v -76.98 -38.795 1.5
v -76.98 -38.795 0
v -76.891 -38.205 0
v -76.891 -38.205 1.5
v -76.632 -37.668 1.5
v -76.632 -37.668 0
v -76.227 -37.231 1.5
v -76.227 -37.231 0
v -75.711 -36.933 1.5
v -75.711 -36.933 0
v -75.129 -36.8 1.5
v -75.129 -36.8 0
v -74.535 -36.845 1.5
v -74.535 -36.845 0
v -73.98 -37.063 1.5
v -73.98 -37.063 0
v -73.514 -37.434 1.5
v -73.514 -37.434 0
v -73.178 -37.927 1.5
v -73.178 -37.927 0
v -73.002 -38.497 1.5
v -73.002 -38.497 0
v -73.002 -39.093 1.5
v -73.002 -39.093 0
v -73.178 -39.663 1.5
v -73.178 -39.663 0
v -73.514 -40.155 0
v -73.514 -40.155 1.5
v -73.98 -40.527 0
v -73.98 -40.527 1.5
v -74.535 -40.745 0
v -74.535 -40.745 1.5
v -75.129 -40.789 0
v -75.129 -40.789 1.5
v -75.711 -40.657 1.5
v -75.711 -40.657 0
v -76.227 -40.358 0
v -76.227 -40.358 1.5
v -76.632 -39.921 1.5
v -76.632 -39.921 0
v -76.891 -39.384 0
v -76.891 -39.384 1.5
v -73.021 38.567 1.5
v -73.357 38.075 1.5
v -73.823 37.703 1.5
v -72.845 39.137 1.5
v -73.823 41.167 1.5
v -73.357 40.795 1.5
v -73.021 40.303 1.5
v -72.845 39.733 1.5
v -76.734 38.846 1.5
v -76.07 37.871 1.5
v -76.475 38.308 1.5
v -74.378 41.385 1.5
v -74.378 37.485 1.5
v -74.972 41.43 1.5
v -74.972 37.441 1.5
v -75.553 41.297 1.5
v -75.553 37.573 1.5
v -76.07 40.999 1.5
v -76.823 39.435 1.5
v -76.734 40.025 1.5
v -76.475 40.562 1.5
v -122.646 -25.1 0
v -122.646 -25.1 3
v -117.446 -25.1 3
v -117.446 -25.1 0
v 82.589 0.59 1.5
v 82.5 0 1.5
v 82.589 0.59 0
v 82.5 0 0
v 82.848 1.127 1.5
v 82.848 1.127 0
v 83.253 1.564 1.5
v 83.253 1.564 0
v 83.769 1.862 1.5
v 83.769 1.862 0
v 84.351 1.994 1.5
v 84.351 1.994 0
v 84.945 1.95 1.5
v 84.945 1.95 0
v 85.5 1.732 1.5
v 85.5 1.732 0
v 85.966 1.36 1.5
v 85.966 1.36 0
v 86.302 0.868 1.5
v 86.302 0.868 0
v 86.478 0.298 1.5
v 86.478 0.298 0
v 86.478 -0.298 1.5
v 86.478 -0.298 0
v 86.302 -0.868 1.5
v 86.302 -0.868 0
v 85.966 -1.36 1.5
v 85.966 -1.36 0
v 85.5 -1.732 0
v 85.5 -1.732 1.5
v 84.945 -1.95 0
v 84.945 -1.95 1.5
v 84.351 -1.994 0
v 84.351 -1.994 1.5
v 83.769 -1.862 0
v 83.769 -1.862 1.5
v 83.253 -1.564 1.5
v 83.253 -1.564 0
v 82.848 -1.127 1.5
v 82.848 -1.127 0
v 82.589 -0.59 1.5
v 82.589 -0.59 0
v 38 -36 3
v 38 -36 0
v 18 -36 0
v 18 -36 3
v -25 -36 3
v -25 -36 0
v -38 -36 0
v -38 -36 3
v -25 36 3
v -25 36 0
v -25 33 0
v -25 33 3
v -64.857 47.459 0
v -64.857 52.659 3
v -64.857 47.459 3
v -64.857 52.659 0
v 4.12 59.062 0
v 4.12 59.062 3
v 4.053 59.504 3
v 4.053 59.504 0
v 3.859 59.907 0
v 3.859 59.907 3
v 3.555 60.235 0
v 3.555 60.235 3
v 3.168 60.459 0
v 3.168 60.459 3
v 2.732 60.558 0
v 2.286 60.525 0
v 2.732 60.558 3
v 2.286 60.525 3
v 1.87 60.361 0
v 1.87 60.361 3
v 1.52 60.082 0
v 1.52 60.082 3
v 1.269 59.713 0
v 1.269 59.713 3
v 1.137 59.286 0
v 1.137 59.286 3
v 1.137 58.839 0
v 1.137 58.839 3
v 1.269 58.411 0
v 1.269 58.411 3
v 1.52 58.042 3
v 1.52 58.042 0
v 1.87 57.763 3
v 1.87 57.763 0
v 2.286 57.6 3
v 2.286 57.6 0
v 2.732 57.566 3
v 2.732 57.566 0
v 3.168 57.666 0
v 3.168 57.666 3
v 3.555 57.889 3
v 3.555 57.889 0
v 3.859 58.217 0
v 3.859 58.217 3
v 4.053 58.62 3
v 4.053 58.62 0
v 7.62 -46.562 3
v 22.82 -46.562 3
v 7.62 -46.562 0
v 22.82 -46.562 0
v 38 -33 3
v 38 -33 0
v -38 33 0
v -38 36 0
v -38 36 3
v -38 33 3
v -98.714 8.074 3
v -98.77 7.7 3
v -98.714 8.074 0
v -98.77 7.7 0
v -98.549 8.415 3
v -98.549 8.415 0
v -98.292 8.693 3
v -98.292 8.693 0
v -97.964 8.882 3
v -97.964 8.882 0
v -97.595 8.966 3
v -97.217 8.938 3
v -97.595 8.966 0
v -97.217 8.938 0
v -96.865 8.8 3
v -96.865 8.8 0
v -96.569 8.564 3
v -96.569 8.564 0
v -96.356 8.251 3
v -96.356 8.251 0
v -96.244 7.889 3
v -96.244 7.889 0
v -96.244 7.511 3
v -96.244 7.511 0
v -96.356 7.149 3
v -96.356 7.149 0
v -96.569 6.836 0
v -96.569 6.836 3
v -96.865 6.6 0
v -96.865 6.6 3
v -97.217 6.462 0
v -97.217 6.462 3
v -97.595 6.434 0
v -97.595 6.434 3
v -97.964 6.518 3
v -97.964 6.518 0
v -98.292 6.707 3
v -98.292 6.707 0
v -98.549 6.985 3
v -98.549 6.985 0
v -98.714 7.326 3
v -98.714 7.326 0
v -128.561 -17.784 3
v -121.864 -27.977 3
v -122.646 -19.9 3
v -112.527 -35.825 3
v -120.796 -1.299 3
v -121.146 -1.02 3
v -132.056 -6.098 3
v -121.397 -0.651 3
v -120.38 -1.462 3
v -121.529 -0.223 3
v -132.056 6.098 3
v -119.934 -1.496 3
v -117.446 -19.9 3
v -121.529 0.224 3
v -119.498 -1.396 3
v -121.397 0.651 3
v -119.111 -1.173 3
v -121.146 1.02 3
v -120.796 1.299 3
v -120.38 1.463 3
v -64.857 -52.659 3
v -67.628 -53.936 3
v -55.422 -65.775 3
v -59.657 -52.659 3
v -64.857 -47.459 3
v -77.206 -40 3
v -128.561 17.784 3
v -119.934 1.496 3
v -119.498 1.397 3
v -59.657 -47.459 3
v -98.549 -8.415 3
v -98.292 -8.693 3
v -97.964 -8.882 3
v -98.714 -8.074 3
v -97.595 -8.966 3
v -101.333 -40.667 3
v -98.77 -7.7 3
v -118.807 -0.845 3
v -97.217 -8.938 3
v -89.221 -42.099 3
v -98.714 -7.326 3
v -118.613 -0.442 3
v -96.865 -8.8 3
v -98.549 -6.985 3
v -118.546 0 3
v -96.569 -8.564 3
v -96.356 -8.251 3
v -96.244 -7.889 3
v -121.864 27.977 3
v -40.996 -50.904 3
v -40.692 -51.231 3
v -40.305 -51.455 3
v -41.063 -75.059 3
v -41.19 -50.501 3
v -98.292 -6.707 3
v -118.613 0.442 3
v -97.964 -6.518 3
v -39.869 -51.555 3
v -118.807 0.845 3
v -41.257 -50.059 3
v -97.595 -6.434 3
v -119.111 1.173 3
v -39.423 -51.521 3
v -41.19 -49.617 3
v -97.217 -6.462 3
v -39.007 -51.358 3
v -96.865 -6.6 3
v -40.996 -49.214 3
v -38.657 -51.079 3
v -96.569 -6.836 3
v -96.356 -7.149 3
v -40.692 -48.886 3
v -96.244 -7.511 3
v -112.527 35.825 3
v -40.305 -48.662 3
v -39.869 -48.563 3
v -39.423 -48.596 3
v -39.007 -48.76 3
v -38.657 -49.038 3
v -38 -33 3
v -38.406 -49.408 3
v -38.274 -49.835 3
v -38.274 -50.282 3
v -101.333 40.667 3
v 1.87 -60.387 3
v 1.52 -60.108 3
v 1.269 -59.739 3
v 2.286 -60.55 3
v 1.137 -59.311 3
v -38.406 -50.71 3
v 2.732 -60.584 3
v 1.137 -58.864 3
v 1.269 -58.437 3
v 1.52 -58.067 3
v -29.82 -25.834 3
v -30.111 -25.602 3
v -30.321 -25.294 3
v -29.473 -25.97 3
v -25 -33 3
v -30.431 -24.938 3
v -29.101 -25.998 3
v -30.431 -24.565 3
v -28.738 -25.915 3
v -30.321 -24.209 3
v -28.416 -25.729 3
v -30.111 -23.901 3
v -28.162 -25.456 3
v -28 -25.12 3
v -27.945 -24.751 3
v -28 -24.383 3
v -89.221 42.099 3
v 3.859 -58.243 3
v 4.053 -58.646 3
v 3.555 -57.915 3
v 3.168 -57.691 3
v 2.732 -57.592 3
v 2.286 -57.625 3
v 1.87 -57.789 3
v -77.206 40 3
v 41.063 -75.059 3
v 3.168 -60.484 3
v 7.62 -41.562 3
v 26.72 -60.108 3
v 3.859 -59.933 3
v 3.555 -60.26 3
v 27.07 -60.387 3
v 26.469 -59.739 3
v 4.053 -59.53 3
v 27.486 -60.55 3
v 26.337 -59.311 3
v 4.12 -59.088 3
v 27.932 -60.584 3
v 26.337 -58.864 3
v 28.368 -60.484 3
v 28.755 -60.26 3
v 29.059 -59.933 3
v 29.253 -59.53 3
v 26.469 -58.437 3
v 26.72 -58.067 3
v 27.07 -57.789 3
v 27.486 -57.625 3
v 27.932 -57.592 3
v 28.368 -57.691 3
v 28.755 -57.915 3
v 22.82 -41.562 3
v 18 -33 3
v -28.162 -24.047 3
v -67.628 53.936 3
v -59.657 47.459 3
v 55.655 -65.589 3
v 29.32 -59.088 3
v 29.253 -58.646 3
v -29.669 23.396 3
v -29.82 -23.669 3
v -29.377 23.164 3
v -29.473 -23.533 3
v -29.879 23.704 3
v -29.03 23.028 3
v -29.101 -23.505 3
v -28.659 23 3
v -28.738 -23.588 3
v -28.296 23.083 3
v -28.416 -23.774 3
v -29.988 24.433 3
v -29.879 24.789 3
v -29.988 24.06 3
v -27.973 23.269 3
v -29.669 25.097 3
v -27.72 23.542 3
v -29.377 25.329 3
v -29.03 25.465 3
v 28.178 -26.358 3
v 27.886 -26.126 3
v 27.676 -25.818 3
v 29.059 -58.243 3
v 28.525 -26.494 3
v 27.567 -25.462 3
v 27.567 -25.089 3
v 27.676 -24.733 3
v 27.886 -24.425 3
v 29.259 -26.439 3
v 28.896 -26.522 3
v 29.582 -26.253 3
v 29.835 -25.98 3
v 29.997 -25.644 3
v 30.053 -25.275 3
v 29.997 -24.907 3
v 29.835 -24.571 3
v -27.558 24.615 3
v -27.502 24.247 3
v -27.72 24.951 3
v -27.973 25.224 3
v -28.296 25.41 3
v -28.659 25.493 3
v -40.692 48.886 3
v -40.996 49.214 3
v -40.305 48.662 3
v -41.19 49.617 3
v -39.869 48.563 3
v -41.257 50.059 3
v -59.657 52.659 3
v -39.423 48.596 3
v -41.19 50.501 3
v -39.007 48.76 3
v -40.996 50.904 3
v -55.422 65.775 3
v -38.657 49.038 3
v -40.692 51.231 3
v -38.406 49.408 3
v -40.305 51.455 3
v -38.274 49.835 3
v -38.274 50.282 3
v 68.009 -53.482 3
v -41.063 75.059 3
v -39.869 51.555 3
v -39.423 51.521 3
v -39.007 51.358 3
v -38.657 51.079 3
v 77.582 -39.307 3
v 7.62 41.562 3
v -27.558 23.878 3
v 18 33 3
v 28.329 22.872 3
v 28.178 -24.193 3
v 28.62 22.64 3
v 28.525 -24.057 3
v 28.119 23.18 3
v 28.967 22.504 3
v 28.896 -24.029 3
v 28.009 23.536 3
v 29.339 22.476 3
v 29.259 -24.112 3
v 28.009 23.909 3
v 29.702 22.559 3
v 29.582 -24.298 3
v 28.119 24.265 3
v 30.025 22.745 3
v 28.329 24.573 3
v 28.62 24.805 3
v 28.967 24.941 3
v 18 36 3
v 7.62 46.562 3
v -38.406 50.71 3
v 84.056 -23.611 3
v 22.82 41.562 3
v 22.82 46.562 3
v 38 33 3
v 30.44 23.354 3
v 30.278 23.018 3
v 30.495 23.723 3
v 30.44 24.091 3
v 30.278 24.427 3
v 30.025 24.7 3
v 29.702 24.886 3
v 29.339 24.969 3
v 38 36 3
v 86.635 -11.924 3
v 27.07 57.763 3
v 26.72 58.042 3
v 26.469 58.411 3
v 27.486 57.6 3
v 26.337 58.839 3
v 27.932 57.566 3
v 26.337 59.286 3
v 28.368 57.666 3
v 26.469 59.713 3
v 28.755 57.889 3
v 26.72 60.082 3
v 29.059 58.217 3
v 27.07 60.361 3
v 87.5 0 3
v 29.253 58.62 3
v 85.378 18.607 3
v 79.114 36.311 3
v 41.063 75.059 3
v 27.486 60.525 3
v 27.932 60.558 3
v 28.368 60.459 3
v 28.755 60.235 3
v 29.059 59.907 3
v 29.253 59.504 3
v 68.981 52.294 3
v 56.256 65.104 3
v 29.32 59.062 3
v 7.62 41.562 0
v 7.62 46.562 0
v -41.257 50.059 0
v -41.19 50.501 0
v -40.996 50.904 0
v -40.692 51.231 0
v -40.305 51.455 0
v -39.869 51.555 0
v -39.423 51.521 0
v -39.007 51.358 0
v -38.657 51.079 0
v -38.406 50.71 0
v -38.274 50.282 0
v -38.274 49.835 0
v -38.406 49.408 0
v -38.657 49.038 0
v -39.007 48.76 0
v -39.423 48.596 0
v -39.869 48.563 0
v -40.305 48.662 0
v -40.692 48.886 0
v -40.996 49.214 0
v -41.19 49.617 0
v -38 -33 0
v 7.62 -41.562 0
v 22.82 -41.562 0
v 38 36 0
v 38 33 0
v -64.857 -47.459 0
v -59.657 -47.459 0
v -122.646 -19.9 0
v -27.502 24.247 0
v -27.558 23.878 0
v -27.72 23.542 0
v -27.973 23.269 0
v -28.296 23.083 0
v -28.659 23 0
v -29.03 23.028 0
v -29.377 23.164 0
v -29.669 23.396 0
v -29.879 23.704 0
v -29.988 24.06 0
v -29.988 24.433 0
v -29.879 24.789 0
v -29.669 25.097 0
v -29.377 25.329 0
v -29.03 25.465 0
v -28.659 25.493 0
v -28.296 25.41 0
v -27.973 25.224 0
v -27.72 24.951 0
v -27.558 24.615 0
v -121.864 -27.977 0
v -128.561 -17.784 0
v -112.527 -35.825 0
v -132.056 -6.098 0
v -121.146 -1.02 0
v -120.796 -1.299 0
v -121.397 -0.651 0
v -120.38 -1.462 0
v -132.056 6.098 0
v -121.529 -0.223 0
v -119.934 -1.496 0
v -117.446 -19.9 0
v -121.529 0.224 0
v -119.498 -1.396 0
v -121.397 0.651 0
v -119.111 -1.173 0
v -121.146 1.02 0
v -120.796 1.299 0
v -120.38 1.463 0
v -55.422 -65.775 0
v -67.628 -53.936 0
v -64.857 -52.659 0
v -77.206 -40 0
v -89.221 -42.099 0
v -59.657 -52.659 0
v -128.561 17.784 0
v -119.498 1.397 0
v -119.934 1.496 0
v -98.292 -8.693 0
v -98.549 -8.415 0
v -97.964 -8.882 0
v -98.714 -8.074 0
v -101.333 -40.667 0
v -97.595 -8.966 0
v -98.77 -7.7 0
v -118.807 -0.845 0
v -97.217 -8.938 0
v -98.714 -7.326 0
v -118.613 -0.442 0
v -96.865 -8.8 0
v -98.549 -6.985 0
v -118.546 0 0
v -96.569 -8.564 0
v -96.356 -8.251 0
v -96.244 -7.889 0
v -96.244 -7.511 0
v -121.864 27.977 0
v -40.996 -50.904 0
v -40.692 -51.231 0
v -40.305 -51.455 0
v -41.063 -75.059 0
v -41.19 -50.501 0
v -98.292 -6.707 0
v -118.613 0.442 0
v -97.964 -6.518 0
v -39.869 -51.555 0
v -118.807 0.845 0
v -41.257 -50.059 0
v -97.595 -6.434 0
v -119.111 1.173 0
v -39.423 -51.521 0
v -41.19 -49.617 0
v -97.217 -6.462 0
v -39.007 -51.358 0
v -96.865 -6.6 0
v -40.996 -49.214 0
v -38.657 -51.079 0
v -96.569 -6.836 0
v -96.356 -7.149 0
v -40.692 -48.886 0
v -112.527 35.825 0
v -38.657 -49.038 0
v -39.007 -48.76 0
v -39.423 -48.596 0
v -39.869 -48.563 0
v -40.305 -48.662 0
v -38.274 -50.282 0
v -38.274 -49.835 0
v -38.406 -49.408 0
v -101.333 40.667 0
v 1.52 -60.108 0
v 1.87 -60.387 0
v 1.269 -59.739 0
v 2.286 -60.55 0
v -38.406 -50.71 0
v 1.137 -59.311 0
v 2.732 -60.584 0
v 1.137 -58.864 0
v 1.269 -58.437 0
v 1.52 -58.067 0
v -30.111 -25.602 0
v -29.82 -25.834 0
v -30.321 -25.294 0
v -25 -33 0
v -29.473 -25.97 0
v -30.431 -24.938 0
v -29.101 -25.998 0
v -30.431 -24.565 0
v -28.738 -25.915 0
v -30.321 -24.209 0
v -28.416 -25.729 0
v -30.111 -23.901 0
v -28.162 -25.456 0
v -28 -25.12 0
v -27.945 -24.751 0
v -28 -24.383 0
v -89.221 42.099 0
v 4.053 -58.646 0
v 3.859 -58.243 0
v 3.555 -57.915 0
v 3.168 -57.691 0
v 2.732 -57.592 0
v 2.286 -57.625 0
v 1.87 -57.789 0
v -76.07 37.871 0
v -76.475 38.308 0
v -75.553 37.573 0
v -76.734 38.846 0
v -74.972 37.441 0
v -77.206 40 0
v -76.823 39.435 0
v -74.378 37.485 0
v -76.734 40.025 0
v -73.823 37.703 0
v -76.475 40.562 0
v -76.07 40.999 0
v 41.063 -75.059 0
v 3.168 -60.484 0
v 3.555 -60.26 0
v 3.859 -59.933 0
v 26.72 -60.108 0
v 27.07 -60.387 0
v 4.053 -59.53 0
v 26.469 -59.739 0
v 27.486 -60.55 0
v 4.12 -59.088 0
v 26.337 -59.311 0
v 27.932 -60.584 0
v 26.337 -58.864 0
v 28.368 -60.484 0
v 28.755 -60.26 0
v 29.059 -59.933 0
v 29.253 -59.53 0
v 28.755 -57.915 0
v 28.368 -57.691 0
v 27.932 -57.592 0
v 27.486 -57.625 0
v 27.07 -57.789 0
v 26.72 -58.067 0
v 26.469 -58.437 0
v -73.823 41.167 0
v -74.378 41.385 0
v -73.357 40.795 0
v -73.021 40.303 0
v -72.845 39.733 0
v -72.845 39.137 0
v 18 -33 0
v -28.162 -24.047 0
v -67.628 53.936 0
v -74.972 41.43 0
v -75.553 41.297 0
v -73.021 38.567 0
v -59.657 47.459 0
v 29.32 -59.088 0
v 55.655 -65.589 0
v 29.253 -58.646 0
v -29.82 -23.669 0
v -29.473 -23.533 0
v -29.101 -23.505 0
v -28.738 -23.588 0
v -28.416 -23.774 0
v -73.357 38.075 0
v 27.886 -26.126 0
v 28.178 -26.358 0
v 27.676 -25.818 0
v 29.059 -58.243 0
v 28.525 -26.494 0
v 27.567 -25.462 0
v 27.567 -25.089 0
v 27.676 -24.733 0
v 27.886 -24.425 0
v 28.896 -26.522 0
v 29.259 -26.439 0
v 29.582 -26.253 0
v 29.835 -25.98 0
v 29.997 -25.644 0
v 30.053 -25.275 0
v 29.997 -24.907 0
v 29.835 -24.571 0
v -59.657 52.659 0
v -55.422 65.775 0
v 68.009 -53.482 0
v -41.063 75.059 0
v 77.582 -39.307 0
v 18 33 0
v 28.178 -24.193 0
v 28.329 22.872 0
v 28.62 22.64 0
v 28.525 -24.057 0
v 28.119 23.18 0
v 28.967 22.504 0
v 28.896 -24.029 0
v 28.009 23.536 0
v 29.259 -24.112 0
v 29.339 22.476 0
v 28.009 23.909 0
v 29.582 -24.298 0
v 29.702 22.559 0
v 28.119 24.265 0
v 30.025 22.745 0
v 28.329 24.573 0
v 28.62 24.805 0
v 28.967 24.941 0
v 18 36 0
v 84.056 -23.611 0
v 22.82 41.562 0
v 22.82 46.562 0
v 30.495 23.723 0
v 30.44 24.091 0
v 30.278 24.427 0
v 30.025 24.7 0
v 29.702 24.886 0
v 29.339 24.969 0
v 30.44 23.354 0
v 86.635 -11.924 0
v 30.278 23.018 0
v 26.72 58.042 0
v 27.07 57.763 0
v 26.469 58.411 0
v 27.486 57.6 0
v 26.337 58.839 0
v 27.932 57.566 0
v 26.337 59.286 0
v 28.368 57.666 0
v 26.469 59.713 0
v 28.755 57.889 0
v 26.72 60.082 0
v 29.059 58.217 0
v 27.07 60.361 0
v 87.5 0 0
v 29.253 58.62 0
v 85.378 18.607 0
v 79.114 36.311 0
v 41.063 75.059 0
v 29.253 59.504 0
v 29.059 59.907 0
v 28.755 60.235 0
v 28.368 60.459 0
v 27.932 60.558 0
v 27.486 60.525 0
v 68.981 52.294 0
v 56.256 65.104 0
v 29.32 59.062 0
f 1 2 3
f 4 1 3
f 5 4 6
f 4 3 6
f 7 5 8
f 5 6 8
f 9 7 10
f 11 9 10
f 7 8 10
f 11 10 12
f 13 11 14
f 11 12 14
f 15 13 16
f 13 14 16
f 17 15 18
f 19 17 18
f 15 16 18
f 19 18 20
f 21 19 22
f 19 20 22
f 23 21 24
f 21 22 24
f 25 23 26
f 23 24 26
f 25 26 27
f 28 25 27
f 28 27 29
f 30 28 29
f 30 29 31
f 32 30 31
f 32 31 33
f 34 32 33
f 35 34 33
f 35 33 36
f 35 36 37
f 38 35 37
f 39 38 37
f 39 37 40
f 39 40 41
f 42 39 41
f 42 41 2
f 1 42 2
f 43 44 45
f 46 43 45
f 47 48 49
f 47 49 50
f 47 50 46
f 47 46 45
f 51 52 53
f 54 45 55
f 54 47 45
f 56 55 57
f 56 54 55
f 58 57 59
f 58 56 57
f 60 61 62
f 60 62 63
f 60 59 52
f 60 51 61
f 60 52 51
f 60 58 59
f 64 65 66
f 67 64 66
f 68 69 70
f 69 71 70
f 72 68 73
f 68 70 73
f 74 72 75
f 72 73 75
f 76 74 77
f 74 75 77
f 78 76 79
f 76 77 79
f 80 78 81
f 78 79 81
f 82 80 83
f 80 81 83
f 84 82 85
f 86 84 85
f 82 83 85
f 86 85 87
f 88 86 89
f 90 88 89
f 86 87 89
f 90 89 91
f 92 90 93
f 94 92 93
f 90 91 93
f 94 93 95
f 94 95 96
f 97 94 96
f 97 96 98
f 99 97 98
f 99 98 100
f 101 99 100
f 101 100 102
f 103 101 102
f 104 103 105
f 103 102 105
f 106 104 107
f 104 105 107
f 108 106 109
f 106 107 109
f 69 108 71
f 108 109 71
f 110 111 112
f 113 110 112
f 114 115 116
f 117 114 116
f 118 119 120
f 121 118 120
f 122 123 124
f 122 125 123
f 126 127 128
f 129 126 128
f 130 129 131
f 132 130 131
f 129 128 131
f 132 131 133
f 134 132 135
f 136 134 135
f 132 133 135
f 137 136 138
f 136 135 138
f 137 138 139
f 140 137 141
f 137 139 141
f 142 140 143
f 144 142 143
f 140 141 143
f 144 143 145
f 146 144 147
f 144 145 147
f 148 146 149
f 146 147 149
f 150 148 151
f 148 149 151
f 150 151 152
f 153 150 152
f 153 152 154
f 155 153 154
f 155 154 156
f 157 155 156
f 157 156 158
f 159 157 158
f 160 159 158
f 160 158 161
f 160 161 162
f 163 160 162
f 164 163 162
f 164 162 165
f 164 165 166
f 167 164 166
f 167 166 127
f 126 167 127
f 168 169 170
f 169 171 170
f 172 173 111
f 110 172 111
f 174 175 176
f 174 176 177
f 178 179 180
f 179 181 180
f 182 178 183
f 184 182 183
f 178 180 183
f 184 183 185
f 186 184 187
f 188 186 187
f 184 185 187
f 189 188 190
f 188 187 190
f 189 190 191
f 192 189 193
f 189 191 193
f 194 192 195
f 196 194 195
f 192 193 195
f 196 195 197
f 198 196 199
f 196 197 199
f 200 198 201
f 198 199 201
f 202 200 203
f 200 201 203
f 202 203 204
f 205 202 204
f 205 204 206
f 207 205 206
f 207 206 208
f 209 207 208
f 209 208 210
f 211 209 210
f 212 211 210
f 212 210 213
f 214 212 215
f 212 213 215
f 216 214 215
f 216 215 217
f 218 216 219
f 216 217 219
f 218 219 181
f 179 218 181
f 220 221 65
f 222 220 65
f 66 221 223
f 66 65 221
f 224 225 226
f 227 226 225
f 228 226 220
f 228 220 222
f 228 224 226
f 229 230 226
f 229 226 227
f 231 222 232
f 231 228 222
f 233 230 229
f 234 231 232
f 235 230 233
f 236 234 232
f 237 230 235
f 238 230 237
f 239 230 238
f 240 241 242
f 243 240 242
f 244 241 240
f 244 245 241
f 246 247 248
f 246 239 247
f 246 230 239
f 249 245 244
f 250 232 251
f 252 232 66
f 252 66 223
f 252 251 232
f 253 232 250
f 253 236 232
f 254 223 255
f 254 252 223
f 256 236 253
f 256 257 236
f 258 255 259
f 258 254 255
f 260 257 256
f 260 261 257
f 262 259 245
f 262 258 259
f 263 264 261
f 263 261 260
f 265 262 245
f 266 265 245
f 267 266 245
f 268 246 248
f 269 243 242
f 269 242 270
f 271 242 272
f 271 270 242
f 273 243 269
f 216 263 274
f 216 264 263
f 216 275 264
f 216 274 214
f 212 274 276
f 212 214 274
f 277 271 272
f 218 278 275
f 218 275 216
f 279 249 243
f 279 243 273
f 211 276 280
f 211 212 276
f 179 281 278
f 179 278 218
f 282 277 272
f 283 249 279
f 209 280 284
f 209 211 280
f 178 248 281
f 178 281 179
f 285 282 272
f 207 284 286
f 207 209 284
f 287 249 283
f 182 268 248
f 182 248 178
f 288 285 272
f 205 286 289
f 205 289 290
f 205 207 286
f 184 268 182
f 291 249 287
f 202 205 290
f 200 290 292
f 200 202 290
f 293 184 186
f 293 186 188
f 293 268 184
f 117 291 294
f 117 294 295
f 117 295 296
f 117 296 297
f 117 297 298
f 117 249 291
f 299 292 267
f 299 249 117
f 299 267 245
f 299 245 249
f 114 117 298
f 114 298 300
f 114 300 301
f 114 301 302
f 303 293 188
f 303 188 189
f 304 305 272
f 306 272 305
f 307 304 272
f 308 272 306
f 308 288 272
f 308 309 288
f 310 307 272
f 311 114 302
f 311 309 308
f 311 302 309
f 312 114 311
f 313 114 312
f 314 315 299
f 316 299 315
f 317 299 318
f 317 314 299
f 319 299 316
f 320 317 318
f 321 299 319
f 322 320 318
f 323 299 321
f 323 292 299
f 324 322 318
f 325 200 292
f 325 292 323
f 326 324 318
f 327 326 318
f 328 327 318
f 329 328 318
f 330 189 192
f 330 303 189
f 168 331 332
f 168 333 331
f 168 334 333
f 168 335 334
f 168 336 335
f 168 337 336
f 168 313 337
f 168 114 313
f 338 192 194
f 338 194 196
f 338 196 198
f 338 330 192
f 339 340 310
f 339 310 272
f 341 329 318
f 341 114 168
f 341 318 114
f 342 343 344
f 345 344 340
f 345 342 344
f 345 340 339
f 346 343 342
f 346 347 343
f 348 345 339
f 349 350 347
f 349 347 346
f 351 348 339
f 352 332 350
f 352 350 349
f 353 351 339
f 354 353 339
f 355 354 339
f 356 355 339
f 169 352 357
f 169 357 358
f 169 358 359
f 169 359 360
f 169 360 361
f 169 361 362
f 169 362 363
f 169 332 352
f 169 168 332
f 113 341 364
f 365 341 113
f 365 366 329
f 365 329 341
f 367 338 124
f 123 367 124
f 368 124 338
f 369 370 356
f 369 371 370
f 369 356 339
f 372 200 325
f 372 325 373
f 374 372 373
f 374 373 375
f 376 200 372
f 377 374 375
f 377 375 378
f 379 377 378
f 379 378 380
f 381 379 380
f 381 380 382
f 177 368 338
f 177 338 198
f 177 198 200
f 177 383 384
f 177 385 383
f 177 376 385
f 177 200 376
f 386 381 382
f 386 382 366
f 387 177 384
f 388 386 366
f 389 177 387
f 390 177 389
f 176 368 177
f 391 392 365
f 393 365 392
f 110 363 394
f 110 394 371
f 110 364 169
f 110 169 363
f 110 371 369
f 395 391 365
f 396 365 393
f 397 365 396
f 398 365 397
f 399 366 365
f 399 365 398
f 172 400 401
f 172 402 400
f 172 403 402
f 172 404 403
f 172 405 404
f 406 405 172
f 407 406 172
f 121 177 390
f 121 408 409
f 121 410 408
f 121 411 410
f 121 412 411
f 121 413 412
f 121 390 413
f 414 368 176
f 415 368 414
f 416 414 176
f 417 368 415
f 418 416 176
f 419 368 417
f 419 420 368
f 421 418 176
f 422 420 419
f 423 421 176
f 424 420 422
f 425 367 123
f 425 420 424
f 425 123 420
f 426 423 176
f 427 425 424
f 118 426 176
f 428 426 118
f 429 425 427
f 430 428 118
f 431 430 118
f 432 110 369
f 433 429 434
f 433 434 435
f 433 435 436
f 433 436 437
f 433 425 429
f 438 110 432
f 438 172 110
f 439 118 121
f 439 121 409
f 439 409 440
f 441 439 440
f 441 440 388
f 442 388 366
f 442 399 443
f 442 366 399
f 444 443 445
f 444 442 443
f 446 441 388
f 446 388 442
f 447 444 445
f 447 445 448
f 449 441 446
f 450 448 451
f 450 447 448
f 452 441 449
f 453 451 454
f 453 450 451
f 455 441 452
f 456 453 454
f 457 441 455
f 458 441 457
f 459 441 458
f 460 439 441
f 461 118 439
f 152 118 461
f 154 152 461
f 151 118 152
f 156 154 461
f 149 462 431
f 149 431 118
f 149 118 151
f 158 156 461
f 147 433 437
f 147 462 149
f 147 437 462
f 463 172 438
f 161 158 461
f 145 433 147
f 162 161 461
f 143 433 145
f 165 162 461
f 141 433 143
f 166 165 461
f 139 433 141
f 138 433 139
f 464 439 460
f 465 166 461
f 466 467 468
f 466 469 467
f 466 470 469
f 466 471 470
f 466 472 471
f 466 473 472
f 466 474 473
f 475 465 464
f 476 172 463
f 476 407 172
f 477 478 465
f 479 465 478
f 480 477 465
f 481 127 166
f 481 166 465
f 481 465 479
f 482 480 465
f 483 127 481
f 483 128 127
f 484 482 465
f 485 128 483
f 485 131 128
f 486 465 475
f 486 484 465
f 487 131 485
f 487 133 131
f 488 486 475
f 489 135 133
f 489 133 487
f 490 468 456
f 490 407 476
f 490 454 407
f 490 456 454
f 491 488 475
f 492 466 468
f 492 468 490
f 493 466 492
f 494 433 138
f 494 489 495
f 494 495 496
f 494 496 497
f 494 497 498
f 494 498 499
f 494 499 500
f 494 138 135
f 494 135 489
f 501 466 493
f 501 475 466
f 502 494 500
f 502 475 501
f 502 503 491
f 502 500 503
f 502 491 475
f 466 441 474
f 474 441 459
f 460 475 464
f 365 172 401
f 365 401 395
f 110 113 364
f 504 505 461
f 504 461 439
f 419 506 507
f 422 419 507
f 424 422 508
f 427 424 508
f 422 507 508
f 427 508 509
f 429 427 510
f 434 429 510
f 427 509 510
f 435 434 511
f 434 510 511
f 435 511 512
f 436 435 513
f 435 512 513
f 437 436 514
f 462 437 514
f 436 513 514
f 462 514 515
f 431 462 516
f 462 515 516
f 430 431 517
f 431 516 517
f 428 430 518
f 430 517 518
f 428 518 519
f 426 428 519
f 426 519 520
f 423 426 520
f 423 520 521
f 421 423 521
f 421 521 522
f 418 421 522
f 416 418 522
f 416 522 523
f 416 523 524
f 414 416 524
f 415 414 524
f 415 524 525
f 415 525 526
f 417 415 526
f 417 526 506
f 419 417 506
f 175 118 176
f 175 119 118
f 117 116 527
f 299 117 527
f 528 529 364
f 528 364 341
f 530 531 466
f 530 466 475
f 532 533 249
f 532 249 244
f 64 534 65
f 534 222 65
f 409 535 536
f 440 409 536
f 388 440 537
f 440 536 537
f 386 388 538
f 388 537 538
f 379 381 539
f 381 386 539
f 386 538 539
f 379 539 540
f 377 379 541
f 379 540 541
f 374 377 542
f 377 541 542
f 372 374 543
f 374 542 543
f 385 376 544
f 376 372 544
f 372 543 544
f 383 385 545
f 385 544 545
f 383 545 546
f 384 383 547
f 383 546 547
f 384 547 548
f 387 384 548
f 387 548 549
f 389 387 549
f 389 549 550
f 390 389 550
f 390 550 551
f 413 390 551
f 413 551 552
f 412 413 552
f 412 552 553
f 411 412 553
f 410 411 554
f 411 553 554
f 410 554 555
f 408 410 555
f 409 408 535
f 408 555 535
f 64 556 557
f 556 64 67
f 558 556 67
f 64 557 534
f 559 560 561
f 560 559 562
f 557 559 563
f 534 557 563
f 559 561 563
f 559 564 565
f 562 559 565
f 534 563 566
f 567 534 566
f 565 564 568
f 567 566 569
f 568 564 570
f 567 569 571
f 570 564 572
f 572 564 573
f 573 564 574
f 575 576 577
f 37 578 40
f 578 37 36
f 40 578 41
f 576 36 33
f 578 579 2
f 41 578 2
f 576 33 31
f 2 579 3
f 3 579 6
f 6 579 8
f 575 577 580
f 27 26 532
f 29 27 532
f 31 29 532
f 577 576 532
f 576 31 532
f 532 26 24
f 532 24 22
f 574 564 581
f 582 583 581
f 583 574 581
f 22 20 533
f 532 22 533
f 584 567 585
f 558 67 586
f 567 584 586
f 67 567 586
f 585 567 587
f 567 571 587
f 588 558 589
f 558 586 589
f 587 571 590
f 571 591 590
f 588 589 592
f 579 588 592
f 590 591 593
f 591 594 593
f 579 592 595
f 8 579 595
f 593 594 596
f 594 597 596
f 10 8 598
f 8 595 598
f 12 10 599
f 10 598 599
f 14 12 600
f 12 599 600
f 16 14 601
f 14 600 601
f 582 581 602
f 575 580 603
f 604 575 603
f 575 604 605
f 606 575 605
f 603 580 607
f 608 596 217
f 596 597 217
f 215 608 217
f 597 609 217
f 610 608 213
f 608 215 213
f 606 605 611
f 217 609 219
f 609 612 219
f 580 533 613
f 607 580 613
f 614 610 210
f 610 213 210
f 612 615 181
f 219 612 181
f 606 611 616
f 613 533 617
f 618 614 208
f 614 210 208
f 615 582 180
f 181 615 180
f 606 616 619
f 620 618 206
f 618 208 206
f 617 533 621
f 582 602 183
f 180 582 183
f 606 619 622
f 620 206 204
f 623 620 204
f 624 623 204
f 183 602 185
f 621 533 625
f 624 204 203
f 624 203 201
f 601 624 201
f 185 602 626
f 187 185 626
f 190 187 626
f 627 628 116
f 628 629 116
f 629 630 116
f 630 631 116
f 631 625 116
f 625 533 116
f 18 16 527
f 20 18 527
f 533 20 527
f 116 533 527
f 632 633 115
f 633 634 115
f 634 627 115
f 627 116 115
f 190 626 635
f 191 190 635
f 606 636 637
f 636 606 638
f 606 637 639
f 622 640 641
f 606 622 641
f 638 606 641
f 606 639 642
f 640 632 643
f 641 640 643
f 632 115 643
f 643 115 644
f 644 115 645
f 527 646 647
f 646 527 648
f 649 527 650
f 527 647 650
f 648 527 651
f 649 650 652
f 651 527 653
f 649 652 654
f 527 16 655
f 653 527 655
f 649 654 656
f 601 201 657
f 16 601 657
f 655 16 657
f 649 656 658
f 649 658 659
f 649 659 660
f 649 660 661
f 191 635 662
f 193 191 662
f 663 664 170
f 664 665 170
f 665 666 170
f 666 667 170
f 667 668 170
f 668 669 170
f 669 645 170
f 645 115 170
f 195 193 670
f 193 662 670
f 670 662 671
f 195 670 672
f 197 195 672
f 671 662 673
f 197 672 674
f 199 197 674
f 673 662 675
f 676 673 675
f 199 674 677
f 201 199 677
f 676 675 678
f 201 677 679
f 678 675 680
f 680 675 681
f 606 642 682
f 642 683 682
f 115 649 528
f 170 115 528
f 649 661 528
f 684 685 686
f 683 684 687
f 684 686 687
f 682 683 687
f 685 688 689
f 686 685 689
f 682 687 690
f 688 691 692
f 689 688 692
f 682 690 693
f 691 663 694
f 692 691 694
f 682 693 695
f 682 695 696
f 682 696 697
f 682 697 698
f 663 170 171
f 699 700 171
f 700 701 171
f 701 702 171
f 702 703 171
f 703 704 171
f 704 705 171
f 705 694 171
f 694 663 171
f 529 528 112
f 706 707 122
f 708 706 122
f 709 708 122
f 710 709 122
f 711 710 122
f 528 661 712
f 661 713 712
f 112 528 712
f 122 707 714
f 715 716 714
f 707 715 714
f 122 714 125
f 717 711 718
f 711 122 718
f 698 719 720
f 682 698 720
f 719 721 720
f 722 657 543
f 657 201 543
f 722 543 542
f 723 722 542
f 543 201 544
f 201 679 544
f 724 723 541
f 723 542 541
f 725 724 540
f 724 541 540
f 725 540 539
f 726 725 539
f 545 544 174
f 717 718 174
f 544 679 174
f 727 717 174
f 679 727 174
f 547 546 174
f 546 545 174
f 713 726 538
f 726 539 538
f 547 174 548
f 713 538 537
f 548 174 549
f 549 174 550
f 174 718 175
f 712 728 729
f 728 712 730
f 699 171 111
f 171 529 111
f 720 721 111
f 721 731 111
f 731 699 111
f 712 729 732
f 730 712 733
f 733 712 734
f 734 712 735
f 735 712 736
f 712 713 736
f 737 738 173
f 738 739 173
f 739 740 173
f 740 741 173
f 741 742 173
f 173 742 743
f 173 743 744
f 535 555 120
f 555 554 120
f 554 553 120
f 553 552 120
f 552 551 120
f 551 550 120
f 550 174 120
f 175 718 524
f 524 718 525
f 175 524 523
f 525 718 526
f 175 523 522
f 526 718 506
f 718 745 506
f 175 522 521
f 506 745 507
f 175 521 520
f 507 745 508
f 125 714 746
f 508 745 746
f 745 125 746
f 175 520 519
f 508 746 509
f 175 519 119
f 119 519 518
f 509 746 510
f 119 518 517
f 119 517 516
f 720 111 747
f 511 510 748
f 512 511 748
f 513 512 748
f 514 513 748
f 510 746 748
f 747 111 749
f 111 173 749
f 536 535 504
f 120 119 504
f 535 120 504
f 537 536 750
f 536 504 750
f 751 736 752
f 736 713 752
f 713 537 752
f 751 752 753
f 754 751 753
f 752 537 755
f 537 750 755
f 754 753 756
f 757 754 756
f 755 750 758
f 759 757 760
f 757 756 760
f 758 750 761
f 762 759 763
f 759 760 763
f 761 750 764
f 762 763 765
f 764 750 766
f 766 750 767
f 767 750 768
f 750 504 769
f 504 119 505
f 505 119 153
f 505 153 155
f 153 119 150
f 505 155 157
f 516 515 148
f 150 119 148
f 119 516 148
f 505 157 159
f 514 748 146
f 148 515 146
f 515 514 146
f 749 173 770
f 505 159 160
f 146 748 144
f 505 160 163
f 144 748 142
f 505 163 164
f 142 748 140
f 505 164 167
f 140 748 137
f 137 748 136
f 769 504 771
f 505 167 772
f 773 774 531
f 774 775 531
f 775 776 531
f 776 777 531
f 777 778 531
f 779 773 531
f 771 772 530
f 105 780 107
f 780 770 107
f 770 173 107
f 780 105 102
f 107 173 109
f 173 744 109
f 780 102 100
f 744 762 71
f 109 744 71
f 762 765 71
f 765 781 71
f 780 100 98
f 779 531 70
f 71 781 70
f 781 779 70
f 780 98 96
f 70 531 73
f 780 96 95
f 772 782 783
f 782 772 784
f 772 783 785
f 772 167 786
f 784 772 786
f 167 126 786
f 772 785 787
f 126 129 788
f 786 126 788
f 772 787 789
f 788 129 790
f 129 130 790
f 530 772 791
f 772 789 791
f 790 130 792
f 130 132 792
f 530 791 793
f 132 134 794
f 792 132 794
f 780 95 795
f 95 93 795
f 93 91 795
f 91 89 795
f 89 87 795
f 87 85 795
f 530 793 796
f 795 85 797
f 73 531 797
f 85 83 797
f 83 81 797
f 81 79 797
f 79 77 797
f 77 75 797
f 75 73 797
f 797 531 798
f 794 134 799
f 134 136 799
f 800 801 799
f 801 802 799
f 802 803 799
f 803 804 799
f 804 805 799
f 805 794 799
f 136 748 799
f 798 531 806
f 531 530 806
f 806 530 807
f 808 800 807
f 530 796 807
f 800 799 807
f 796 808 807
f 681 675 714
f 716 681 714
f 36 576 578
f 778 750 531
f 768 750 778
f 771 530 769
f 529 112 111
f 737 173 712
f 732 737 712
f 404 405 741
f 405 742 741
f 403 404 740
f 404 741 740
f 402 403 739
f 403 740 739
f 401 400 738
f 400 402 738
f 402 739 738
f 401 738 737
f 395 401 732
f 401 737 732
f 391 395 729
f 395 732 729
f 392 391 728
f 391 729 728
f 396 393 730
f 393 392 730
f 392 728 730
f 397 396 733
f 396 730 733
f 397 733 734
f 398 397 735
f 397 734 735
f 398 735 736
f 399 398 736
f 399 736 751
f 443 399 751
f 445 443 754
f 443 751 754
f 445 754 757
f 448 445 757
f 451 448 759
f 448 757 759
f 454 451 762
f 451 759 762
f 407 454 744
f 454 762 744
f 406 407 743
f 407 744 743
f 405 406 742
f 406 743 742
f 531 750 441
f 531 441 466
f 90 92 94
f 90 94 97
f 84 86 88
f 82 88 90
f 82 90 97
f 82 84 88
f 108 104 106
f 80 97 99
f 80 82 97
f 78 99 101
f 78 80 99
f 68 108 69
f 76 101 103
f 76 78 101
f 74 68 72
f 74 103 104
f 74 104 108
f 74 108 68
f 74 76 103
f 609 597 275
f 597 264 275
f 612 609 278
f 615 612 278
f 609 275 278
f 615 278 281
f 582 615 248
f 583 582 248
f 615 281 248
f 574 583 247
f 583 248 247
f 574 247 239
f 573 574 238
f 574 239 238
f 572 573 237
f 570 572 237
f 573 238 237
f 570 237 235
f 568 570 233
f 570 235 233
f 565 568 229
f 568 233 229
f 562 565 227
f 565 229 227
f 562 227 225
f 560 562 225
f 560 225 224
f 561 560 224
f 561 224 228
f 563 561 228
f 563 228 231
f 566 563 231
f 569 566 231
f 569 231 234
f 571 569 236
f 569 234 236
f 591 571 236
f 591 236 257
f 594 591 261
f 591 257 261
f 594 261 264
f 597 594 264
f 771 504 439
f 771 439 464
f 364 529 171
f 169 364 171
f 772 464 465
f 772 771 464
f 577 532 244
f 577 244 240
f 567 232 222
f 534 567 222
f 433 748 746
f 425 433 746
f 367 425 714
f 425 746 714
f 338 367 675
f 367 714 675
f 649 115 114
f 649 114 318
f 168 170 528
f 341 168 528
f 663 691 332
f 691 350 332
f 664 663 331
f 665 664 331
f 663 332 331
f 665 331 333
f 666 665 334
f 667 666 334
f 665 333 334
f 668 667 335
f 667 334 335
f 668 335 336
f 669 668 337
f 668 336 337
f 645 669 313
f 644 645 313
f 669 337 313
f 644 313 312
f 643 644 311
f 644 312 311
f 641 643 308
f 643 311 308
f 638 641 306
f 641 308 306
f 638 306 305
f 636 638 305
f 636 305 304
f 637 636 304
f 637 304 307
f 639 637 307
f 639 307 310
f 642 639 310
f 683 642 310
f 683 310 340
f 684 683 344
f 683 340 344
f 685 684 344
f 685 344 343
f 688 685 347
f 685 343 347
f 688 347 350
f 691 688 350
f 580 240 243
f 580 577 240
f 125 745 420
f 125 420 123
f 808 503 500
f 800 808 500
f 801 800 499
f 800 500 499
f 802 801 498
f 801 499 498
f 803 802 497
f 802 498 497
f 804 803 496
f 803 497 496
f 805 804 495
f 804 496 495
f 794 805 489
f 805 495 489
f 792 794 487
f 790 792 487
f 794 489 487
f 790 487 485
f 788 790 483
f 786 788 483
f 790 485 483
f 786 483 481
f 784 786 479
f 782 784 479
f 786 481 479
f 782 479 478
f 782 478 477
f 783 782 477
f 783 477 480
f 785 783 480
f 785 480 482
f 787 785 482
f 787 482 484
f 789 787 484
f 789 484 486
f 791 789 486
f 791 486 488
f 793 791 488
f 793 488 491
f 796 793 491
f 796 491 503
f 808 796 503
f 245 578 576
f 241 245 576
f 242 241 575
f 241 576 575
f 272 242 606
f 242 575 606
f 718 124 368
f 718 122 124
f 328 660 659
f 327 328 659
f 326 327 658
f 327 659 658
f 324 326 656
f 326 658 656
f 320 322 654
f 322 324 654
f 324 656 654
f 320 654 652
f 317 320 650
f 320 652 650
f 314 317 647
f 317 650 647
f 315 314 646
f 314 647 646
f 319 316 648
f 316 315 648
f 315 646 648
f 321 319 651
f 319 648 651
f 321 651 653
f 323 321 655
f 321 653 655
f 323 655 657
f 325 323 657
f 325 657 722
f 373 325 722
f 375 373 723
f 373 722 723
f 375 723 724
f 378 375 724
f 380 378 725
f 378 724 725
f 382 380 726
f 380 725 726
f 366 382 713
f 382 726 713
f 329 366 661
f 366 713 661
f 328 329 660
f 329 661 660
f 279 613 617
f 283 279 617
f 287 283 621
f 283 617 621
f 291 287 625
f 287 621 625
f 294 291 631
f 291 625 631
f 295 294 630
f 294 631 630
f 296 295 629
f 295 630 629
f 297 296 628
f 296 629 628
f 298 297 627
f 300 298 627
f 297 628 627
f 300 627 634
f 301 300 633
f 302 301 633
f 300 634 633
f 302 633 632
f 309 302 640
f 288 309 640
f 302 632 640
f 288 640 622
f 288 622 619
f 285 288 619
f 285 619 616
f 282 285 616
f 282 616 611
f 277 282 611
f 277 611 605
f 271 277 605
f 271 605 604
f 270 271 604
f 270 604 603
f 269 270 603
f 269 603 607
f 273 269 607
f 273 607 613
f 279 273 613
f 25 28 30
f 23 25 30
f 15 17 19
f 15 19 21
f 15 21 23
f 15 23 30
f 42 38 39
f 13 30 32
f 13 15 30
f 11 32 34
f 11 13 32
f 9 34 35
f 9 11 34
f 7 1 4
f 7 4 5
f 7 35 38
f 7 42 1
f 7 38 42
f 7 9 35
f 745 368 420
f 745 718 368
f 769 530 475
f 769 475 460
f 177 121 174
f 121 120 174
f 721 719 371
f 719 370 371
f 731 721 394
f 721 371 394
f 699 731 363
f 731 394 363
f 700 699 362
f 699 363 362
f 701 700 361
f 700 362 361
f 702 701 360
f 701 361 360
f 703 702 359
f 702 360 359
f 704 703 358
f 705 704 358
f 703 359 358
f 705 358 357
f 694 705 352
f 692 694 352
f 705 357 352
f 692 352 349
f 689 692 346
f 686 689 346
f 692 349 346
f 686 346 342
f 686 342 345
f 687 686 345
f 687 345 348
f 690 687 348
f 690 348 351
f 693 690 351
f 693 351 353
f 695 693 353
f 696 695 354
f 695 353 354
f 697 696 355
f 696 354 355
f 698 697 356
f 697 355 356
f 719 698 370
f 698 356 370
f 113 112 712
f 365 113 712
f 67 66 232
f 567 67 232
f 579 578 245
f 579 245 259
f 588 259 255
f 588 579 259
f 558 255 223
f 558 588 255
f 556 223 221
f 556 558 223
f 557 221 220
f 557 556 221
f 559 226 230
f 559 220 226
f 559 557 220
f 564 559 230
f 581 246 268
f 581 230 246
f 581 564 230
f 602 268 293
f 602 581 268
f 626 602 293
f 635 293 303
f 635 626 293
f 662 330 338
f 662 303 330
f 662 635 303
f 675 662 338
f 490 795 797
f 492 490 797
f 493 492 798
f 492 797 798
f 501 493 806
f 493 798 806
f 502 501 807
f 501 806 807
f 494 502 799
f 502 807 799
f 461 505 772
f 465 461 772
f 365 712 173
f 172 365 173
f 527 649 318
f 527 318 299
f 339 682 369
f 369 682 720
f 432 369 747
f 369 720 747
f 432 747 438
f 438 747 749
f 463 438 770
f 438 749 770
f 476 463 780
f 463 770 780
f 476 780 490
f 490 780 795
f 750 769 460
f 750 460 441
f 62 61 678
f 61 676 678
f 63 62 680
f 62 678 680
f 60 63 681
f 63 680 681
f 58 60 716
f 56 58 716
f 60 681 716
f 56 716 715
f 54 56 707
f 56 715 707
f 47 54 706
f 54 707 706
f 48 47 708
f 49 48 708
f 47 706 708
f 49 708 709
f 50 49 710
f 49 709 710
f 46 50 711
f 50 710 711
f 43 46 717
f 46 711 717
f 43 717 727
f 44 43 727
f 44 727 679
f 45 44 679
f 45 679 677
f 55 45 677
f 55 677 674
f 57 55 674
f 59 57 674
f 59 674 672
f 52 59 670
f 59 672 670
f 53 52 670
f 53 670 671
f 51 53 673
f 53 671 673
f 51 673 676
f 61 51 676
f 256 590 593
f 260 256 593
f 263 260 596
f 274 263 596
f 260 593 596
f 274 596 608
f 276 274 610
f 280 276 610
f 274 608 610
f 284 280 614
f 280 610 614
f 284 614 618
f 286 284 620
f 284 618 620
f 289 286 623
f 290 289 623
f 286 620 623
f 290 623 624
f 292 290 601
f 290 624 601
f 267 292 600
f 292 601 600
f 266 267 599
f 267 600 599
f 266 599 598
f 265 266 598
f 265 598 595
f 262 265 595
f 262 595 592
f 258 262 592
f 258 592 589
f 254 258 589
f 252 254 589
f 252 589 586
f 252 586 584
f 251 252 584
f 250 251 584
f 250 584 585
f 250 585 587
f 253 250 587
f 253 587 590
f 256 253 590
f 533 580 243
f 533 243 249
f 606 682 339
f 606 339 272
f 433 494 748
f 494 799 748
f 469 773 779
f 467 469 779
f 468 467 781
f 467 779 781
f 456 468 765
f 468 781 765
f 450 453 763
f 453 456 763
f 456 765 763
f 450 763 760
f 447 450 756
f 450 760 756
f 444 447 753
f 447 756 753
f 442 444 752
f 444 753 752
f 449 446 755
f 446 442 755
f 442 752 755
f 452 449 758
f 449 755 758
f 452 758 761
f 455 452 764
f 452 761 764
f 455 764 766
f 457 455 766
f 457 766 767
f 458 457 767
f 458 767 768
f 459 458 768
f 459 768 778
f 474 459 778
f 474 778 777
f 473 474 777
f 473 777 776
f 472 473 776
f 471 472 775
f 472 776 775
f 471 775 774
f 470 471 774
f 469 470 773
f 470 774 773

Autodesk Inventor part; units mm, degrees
ref_plane "YZ Plane" through (0, 0, 0) normal (1, 0, 0) x (0, 1, 0)
ref_plane "XZ Plane" through (0, 0, 0) normal (0, 1, 0) x (-1, 0, 0)
ref_plane "XY Plane" through (0, 0, 0) normal (0, 0, 1) x (1, 0, 0)
sketch "Base" plane through (0, 0, 0) normal (0, 0, 1) x (1, 0, 0)
  circle A0 centre (-28.7523, 24.2466) radius 1.25 projected
  circle A1 centre (-29.1949, -24.7514) radius 1.25 projected
  arc A2 (-77.2059, 40) -> (-77.2059, -40) centre (-90.3849, 0) ccw
  line L0 (41.0629, -75.0587) -> (-41.0629, -75.0587)
  ellipse E0 centre (0, 0) end of major axis (-87.5, 0) minor radius 85 (-77.2059, -40) -> (-41.0629, -75.0587) ccw
  line L1 (0, 0) -> (87.5, 0)
  line L2 (41.0629, 75.0587) -> (-41.0629, 75.0587)
  ellipse E1 centre (0, 0) end of major axis (-87.5, 0) minor radius 85 (41.0629, -75.0587) -> (41.0629, 75.0587) ccw
  ellipse E2 centre (0, 0) end of major axis (-87.5, 0) minor radius 85 (-41.0629, 75.0587) -> (-77.2059, 40) ccw
  circle A3 centre (29.2453, 23.7226) radius 1.25 projected
  circle A4 centre (28.8027, -25.2754) radius 1.25 projected
  dimension "d84" = 87.5
  dimension "d85" = 75.0587
  dimension "d88" = 42.1151
sketch "Holes and Mounts" plane through (0, 0, 0) normal (0, 0, 1) x (1, 0, 0)
  line L0 (-9.7798, -74.0877) -> (40.2202, -74.0877)
  circle A0 centre (2.62, -59.0877) radius 1.5
  circle A1 centre (27.82, -59.0877) radius 1.5
  circle A2 centre (-39.757, 45.9313) radius 1.5
  line L1 (-59.657, 43.3313) -> (-64.857, 43.3313)
  line L2 (-64.857, 43.3313) -> (-64.857, 48.5313)
  line L3 (-64.857, 48.5313) -> (-59.657, 48.5313)
  line L4 (-59.657, 48.5313) -> (-59.657, 43.3313)
  line L5 (-59.657, 43.3313) -> (-64.857, 48.5313) construction
  line L6 (-64.857, 43.3313) -> (-59.657, 48.5313) construction
  line L7 (-9.7798, -74.0877) -> (-9.7798, -44.0877)
  line L8 (-9.7798, -44.0877) -> (40.2202, -44.0877)
  line L9 (40.2202, -44.0877) -> (40.2202, -74.0877)
  line L10 (59.2442, -0.0127) -> (-26.2941, -0.0127)
  circle A3 centre (2.62, 59.0622) radius 1.5
  circle A4 centre (27.82, 59.0622) radius 1.5
  line L11 (-9.7798, 74.0622) -> (40.2202, 74.0622)
  line L12 (-9.7798, 44.0622) -> (40.2202, 44.0622)
  line L13 (40.2202, 74.0622) -> (40.2202, 44.0622)
  line L14 (-9.7798, 74.0622) -> (-9.7798, 44.0622)
  circle A5 centre (-39.757, -45.9568) radius 1.5
  line L15 (-59.657, -48.5568) -> (-59.657, -43.3568)
  line L16 (-64.857, -48.5568) -> (-59.657, -48.5568)
  line L17 (-59.657, -43.3568) -> (-64.857, -43.3568)
  line L18 (-64.857, -43.3568) -> (-64.857, -48.5568)
  line L19 (-59.657, -43.3568) -> (-64.857, -48.5568) construction
  line L20 (-64.857, -43.3568) -> (-59.657, -48.5568) construction
  dimension "d53" = 3
  dimension "d54" = 5.2
  dimension "d55" = 5.2
  dimension "d62" = 30
extrude "ComponentARBHoles" add sketch "Base" along normal blind 3
sketch "Holes Only" plane through (0, 0, 3) normal (0, 0, 1) x (1, 0, 0)
  line L0 (-117.446, -25.0998) -> (-117.446, -19.8998)
  line L1 (-117.446, -19.8998) -> (-122.646, -19.8998)
  line L2 (-122.646, -19.8998) -> (-122.646, -25.0998)
  circle A0 centre (-120.046, 0.0002) radius 1.5
  line L3 (-122.646, -25.0998) -> (-117.446, -25.0998)
  circle A1 centre (27.82, -59.0877) radius 1.5
  line L4 (27.82, -59.0877) -> (2.62, -59.0877)
  circle A2 centre (27.82, -59.0877) radius 1.5
  circle A3 centre (2.62, -59.0877) radius 1.5
  circle A4 centre (2.62, -59.0877) radius 1.5
  circle A5 centre (2.62, 59.0622) radius 1.5
  line L5 (2.62, 59.0622) -> (27.82, 59.0622)
  circle A6 centre (2.62, 59.0622) radius 1.5
  circle A7 centre (27.82, 59.0622) radius 1.5
  point P0 (0, 0)
extrude "WheelFrontSensorHoles" cut sketch "Holes Only" against normal blind 10
sketch "SensorHolesSidesSketch" plane through (0, 0, 0) normal (0, 0, -1) x (-1, 0, 0)
  circle A0 centre (39.757, -50.0587) radius 1.5
  line L0 (64.857, -52.6587) -> (59.657, -52.6587)
  line L1 (64.857, -47.4587) -> (64.857, -52.6587)
  line L2 (59.657, -47.4587) -> (64.857, -47.4587)
  line L3 (59.657, -52.6587) -> (59.657, -47.4587)
  circle A1 centre (39.757, -50.0587) radius 1.5
  line L4 (64.857, -52.6587) -> (59.657, -52.6587)
  line L5 (59.657, -52.6587) -> (59.657, -47.4587)
  line L6 (59.657, -47.4587) -> (64.857, -47.4587)
  line L7 (64.857, -47.4587) -> (64.857, -52.6587)
  line L8 (39.757, -45.9568) -> (39.757, -75.0587)
  line L9 (41.0629, -75.0587) -> (-41.0629, -75.0587) projected
  line L10 (39.757, -75.0587) -> (39.757, -50.0587)
  point P0 (0, 0)
  point P1 (39.757, 45.9313)
  point P2 (59.657, 48.5313)
sketch "Sketch9" plane through (0, 0, 3) normal (0, 0, 1) x (1, 0, 0)
  point P0 (0, 0)
sketch "HolderSlotsSketch" plane through (0, 0, 0) normal (0, 0, -1) x (-1, 0, 0)
  line L0 (-41.0629, 75.0587) -> (41.0629, 75.0587) projected
  line L1 (22.9567, 75.0587) -> (-16.4493, 75.0587)
  line L2 (0, 0) -> (-128.8133, 0)
  line L3 (0, 0) -> (-38, 0)
  line L4 (-38, 33) -> (-38, 36)
  line L5 (-38, 36) -> (-18, 36)
  line L6 (25, 36) -> (38, 36)
  line L7 (38, 36) -> (38, 33)
  line L8 (38, 0) -> (0, 0)
  line L9 (-38, 36) -> (-18, 36)
  line L10 (-18, 36) -> (-18, 33)
  line L11 (-18, 33) -> (-38, 33)
  line L12 (-38, 33) -> (-38, 36)
  line L13 (38, 36) -> (25, 36)
  line L14 (25, 36) -> (25, 33)
  line L15 (25, 33) -> (38, 33)
  line L16 (38, 33) -> (38, 36)
  line L17 (-38, -33) -> (-38, -36)
  line L18 (-38, -36) -> (-18, -36)
  line L19 (25, -36) -> (38, -36)
  line L20 (38, -36) -> (38, -33)
  line L21 (-38, -36) -> (-18, -36)
  line L22 (-18, -36) -> (-18, -33)
  line L23 (-18, -33) -> (-38, -33)
  line L24 (-38, -33) -> (-38, -36)
  line L25 (38, -36) -> (25, -36)
  line L26 (25, -36) -> (25, -33)
  line L27 (25, -33) -> (38, -33)
  line L28 (38, -33) -> (38, -36)
extrude "HolderSlots" cut sketch "HolderSlotsSketch" against normal blind 10
sketch "Sketch11" plane through (0, 0, 0) normal (0, 0, -1) x (-1, 0, 0)
  ellipse E0 centre (0, 0) end of major axis (87.5, 0) minor radius 85 (-41.0629, 75.0587) -> (-41.0629, -75.0587) ccw projected
  circle A0 centre (0, 0) radius 81.5
  line L0 (-81.5, 0) -> (-87.5, 0)
  line L1 (-81.5, 0) -> (-84.5, 0)
  circle A1 centre (-84.5, 0) radius 3
  circle A2 centre (-84.5, 0) radius 2
  dimension "d100" = 163
  dimension "d101" = 4
extrude "MagnetHoleBottom" cut sketch "Sketch11" against normal blind 1.5 contours A2 L0 | L0 A2
sketch "Sketch13" plane through (0, 0, 0) normal (0, 0, -1) x (-1, 0, 0)
  circle A0 centre (74.8228, 39.4351) radius 2
  circle A1 centre (74.98, -38.7948) radius 2
  circle A2 centre (74.98, -38.7948) radius 2
  circle A3 centre (74.8228, 39.4351) radius 2
  point P0 (0, 0)
extrude "MagnetHoleSides" cut sketch "Sketch13" against normal blind 1.5
sketch "Sketch14" plane through (0, 0, 0) normal (0, 0, -1) x (-1, 0, 0)
  circle A0 centre (-27.82, 59.0622) radius 1.5 construction
  circle A1 centre (-2.62, 59.0622) radius 1.5 construction
  line L0 (-7.62, 45.0622) -> (-7.62, 41.5622)
  line L1 (-7.62, 41.5622) -> (-22.82, 41.5622)
  line L2 (-22.82, 41.5622) -> (-22.82, 44.0622)
  line L3 (-7.62, 45.0622) -> (-7.62, 46.5622)
  line L4 (-7.62, 46.5622) -> (-22.82, 46.5622)
  line L5 (-22.82, 46.5622) -> (-22.82, 44.0622)
  point P0 (0, 0)
  dimension "d120" = 2.5
  dimension "d121" = 2.5
extrude "Extrusion10" cut sketch "Sketch14" against normal blind 10
mirror "Mirror2" about plane through (0, 0, 0) normal (0, 1, 0) of "Extrusion10"
sketch "Sketch15" plane through (0, 0, 0) normal (0, 0, -1) x (-1, 0, 0)
  circle A0 centre (97.5, 7.7) radius 1.27
  circle A1 centre (97.5, -7.7) radius 1.27
  line L0 (-41.4439, -82.7587) -> (-41.4439, -75.0587)
  arc A2 (77.2059, -40) -> (77.2059, 40) centre (90.3849, 0) ccw projected
  point P0 (0, 0)
  dimension "d122" = 2.54
  dimension "d123" = 2.54
extrude "Ball Caster Holes" cut sketch "Sketch15" against normal blind 10
extrude "Extrusion12" cut sketch "SensorHolesSidesSketch" against normal blind 10
mirror "Mirror3" about plane through (0, 0, 0) normal (0, 1, 0) of "Extrusion12"
properties part number "Base component"
